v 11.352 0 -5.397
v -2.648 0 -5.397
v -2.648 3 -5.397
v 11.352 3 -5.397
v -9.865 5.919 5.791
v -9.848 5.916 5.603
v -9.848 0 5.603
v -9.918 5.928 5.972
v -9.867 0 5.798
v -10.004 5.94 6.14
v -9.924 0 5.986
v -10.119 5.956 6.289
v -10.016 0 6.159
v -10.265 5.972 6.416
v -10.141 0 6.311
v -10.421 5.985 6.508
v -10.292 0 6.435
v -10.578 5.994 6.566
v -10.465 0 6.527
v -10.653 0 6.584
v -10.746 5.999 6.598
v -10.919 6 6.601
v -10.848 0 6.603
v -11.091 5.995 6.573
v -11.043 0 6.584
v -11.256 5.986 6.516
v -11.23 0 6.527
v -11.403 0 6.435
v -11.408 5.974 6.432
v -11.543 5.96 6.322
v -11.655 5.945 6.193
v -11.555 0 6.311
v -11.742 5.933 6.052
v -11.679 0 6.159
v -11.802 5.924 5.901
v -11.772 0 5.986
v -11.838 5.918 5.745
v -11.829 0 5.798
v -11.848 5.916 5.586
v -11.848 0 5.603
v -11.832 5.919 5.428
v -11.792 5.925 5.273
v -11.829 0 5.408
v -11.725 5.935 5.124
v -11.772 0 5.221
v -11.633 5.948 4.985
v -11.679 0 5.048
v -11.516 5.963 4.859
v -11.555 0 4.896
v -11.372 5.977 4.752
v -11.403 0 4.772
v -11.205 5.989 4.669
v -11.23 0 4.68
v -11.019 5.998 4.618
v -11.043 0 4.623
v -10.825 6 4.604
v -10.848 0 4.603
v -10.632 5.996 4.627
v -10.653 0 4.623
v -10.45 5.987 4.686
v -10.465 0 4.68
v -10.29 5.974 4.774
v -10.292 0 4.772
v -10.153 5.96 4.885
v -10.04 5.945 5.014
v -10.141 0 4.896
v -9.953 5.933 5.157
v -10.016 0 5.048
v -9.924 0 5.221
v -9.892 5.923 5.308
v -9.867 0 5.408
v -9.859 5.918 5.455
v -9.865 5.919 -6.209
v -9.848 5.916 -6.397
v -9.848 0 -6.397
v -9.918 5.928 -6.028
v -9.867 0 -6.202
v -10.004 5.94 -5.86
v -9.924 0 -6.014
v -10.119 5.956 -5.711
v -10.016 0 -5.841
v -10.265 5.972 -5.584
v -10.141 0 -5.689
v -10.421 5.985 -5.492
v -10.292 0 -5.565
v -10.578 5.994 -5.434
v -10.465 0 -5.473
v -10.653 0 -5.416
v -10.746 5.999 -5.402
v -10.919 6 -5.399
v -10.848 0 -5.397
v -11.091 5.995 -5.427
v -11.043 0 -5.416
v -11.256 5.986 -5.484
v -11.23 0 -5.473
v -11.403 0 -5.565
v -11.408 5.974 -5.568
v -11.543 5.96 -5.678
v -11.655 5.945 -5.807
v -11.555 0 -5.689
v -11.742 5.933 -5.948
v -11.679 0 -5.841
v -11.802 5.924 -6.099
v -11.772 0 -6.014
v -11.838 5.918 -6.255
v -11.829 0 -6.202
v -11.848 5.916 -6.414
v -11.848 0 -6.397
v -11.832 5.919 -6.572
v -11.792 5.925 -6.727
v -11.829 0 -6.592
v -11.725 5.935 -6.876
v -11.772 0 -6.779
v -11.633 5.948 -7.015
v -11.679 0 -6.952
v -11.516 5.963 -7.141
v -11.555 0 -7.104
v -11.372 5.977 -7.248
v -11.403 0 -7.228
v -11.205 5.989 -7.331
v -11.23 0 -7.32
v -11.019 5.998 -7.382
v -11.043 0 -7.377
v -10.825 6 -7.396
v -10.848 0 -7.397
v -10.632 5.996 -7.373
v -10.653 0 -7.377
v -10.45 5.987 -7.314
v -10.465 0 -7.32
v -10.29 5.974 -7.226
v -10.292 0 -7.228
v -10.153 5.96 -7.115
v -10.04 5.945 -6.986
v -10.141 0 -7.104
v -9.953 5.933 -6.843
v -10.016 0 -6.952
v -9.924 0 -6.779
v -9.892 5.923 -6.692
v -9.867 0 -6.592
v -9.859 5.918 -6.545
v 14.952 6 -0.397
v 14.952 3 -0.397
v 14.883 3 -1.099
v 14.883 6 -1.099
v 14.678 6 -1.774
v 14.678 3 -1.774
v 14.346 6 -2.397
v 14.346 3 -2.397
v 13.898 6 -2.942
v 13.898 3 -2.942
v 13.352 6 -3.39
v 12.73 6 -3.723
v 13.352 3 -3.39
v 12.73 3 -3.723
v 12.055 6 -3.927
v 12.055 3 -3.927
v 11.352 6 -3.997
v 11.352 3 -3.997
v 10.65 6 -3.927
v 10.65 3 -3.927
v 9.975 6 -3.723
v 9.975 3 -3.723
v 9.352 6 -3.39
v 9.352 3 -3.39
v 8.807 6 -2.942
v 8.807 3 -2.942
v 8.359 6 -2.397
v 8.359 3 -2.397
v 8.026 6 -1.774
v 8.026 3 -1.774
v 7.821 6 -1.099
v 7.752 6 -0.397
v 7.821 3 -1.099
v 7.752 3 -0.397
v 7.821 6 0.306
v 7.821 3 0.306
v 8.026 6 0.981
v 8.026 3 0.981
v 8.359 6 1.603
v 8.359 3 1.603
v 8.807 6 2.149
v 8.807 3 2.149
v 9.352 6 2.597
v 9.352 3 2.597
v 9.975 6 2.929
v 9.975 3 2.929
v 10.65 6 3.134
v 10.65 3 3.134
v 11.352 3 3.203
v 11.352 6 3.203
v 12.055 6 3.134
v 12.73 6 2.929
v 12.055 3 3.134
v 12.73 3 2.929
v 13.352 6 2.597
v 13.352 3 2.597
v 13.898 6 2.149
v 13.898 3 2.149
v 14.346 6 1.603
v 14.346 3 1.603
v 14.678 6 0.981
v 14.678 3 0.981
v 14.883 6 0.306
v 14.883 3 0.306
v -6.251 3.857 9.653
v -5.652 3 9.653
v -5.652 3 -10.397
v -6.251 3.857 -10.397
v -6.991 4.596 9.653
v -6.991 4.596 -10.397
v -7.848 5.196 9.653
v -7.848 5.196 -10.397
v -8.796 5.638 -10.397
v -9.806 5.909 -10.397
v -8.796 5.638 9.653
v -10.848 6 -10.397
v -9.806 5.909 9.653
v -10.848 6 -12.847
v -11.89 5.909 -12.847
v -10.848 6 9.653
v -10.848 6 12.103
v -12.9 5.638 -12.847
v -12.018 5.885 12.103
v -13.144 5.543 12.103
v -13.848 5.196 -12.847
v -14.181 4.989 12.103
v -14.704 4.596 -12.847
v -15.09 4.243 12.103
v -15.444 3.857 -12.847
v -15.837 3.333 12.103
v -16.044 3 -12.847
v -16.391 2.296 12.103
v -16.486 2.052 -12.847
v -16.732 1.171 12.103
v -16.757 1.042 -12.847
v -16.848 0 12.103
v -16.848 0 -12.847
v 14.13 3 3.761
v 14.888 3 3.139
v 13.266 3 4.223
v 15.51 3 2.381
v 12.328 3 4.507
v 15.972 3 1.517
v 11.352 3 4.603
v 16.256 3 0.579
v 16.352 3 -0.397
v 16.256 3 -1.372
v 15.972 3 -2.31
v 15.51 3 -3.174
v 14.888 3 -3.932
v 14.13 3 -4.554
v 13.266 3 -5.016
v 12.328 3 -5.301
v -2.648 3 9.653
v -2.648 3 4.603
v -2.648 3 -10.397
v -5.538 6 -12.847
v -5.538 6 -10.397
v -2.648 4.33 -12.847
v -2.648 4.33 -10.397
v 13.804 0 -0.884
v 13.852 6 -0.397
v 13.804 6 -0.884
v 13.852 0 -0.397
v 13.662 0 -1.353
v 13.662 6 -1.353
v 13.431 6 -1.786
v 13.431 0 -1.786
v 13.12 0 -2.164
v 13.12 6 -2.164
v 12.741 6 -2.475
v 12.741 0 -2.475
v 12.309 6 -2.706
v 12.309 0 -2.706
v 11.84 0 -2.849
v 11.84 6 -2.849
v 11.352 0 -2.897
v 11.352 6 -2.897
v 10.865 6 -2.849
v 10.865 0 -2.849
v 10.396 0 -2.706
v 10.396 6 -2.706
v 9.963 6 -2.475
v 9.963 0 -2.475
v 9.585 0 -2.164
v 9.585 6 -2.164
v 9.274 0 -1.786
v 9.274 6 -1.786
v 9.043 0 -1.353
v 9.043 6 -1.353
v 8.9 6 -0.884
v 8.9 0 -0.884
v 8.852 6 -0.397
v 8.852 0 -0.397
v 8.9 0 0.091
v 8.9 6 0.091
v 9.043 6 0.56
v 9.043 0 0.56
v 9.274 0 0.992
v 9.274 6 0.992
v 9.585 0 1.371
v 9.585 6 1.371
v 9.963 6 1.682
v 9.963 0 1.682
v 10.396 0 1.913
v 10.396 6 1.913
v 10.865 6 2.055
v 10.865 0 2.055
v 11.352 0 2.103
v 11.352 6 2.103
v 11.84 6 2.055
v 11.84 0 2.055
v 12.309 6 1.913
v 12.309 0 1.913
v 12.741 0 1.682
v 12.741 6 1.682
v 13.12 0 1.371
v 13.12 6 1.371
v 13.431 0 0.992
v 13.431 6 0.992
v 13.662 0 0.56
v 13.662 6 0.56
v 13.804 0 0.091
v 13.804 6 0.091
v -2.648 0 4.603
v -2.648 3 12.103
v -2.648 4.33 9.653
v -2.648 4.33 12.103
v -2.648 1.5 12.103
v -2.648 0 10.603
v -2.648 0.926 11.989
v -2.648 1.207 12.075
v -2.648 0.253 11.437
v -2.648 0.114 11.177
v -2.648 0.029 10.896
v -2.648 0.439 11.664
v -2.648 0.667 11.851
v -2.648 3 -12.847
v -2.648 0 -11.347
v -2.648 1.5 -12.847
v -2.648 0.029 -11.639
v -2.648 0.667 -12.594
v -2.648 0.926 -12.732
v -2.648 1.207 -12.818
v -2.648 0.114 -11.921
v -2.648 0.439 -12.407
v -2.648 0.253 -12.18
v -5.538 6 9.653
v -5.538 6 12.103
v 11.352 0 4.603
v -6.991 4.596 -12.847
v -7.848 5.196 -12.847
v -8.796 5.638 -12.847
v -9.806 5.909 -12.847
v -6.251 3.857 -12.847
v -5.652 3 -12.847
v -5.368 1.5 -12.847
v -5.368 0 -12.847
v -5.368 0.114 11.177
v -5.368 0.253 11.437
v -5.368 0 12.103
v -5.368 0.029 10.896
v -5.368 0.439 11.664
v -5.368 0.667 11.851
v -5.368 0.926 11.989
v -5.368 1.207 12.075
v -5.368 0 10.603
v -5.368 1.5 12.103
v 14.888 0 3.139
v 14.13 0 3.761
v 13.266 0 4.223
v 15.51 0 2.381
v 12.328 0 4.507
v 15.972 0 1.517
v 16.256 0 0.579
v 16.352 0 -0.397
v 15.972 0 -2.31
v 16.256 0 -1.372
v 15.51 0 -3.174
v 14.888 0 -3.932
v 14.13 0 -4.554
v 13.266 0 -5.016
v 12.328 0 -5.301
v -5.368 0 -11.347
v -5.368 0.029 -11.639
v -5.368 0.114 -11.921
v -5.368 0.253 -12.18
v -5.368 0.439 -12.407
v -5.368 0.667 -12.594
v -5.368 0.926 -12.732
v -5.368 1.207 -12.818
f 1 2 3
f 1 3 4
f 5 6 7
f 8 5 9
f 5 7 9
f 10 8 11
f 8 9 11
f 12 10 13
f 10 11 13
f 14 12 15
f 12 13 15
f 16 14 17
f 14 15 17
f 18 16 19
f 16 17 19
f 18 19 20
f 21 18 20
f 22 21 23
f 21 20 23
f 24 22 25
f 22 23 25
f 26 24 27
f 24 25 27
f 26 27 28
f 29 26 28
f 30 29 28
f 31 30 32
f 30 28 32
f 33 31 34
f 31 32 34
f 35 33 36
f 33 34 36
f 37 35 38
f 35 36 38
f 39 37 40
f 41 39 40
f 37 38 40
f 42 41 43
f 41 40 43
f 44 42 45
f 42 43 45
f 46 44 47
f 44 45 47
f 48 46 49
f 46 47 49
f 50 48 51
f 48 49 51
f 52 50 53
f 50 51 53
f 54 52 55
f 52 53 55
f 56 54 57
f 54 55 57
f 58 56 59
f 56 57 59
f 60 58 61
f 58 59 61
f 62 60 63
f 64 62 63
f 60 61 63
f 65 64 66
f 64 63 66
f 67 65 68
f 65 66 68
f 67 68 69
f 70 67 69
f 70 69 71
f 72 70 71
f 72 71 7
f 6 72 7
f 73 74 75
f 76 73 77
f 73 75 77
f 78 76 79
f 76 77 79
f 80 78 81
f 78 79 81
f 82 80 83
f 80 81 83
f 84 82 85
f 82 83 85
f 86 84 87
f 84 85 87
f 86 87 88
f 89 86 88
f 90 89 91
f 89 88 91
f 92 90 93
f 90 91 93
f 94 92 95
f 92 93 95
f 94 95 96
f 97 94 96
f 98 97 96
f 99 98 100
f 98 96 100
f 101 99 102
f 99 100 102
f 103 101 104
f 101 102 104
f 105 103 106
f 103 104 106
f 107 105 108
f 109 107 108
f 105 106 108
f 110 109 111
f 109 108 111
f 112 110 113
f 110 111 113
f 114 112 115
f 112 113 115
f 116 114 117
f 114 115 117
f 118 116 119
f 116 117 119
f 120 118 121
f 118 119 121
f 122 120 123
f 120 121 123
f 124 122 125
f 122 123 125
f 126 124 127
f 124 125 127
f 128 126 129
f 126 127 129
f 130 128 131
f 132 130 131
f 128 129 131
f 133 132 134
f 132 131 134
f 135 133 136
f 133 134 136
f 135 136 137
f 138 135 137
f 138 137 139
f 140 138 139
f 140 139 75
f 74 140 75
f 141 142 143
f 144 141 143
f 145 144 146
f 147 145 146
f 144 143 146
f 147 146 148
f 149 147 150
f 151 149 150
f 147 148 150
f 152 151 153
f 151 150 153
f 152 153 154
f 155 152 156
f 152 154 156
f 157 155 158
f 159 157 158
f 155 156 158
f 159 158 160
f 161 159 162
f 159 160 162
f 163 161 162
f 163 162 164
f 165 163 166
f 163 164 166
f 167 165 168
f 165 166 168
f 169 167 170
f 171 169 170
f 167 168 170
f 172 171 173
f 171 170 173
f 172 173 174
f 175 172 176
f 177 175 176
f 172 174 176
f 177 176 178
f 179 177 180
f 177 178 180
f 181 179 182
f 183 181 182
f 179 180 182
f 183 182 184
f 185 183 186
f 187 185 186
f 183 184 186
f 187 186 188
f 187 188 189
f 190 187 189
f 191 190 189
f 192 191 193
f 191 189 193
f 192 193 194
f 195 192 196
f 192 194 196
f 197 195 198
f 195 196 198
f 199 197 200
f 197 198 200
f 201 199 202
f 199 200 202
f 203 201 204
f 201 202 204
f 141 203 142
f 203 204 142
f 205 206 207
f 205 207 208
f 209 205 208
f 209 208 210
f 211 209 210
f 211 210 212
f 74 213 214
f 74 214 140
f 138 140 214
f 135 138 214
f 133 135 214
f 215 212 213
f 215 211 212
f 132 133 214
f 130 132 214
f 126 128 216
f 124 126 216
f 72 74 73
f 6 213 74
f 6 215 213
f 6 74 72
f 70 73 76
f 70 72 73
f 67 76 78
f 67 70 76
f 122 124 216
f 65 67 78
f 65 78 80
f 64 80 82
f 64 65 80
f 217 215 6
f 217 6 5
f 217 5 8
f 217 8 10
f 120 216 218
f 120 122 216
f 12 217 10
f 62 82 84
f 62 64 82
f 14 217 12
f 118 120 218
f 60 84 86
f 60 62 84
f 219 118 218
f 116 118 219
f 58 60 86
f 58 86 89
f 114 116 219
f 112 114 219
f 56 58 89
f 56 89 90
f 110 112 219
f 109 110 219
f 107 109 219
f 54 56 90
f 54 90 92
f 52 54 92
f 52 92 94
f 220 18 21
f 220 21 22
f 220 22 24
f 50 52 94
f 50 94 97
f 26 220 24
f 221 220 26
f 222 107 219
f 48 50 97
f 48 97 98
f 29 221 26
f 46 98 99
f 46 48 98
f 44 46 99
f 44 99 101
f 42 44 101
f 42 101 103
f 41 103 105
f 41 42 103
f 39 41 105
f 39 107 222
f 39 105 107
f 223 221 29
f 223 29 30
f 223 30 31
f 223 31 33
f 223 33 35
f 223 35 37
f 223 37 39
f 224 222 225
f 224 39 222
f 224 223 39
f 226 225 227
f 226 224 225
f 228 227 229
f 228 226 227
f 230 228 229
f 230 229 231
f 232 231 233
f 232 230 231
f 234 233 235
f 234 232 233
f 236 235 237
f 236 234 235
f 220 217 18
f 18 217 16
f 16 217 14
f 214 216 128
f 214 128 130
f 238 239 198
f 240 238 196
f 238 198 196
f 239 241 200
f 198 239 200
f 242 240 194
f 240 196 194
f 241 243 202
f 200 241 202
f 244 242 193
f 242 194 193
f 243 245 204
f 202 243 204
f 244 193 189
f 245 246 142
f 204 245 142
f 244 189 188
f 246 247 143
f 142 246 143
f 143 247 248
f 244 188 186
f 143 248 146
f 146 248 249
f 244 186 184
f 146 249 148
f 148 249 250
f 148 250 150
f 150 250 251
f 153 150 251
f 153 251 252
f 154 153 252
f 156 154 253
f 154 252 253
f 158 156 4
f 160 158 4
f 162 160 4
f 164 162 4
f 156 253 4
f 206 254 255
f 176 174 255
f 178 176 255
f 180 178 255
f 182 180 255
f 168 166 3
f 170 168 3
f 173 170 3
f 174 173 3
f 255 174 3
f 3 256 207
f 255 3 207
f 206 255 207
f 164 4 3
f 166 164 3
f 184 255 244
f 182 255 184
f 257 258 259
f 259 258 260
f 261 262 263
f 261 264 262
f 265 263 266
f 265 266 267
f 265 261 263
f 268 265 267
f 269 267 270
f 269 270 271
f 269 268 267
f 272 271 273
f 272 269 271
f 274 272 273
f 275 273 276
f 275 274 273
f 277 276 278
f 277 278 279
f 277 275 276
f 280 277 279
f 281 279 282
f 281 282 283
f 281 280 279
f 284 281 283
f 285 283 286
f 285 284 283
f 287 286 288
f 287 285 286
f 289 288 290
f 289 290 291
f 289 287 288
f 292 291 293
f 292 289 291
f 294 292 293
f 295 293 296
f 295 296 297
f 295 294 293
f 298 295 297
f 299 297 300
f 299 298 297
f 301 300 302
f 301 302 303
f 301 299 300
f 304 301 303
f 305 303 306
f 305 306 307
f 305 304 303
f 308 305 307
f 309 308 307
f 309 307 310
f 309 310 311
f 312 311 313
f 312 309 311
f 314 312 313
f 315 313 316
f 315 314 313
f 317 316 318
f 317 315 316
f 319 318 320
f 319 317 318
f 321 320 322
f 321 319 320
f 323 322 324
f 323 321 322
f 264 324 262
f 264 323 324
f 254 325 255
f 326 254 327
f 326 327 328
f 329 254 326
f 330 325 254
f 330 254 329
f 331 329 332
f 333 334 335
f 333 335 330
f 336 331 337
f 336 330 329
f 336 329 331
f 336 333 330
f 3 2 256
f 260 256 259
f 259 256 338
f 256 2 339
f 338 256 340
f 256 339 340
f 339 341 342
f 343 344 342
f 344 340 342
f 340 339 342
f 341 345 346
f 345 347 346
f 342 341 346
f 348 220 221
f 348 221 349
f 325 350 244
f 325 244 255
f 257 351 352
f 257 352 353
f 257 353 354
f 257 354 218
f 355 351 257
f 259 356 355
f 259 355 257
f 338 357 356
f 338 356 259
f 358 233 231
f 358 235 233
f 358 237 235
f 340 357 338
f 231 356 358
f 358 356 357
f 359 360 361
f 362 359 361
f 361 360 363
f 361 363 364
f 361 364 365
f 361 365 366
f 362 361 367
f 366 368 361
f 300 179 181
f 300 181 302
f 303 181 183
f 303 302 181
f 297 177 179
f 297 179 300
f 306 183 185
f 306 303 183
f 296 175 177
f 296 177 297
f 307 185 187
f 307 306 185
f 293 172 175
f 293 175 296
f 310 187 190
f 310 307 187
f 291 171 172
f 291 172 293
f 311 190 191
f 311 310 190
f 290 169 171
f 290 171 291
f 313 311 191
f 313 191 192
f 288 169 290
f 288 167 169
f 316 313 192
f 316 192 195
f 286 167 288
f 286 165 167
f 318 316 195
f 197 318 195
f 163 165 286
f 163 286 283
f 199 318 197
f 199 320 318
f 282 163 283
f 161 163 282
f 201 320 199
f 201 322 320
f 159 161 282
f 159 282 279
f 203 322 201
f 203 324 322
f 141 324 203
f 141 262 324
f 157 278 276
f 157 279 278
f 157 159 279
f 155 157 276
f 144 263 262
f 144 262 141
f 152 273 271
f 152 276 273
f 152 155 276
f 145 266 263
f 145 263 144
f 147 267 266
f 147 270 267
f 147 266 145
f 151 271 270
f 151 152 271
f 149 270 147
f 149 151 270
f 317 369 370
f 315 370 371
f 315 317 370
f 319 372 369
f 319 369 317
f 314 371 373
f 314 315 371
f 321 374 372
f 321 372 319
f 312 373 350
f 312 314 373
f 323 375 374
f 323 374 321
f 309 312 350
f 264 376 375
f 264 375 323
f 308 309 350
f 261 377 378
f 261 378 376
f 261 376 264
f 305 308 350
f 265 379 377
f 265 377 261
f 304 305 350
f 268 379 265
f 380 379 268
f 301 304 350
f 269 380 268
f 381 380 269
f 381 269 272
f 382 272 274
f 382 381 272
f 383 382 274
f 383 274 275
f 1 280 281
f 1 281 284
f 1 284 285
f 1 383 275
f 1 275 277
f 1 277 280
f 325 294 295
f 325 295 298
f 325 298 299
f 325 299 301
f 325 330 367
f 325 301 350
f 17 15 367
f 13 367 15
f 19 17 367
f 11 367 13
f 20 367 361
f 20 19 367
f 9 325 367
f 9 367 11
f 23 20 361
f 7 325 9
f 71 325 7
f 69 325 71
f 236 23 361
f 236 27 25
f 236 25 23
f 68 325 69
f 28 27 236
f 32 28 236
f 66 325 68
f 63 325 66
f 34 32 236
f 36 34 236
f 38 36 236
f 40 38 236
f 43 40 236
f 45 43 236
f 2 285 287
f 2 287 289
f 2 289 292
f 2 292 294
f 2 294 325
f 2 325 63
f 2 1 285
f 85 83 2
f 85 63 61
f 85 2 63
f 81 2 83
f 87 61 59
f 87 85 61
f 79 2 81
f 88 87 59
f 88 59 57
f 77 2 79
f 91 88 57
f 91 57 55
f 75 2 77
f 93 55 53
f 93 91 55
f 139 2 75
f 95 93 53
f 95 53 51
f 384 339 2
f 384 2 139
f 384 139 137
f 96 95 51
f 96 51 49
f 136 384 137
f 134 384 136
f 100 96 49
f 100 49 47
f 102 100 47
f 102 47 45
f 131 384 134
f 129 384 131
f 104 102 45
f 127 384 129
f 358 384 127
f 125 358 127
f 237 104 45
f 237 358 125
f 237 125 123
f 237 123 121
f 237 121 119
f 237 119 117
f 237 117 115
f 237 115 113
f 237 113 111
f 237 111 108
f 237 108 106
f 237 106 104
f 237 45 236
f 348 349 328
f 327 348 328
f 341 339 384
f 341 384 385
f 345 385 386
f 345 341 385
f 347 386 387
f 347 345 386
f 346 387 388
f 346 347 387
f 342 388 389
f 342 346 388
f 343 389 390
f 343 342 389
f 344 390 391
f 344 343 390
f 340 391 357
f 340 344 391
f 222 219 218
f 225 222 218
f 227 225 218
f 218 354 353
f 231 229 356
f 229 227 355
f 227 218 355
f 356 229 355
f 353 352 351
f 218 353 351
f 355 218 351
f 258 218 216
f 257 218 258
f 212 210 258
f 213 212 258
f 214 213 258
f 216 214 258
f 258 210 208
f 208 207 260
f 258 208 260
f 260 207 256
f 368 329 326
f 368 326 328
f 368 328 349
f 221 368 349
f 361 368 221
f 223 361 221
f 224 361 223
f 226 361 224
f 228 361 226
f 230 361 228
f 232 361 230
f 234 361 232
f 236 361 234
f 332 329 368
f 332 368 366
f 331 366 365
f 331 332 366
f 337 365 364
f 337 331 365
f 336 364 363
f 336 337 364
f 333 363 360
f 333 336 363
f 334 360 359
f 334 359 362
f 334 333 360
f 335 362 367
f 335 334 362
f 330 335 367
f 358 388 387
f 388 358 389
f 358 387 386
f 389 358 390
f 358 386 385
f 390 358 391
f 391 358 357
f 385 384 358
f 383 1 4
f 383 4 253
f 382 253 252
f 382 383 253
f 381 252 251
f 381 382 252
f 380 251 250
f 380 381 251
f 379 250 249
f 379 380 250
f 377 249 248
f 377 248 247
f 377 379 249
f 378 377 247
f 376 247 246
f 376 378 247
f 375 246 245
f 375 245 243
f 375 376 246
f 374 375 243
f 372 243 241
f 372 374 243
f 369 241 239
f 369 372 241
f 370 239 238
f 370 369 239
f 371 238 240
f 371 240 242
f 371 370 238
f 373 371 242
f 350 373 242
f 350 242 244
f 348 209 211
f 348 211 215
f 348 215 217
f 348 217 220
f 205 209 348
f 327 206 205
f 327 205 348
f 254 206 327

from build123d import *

# Parameters (mm, degrees)
CROQUIS1_R              = 2.500000266
CROQUIS1_R_2            = 1.000000047
CROQUIS1_R_3            = 1.000000141
SALIENTE_EXTRUIR1_DEPTH = 3
SALIENTE_EXTRUIR2_DEPTH = 24.95
CROQUIS3_W              = 8.200000763
CROQUIS3_H              = 2.45
SALIENTE_EXTRUIR3_DEPTH = 3
CORTAR_EXTRUIR1_DEPTH   = 31
CORTAR_EXTRUIR2_DEPTH   = 2.72
CROQUIS6_R              = 3.6
CROQUIS6_R_2            = 2.500000266
SALIENTE_EXTRUIR4_DEPTH = 3
CORTAR_EXTRUIR3_DEPTH   = 27
CROQUIS8_R              = 1.000000047
CROQUIS8_R_2            = 1.000000141
CORTAR_EXTRUIR4_DEPTH   = 27


with BuildPart() as part:
    # Croquis1 → Saliente-Extruir1 (new body)
    with BuildSketch(Plane(origin=(0, 0, 0), x_dir=(1, 0, 0), z_dir=(0, 1, 0))):
        with BuildLine():
            Line((-16.847731683, 12.84659639), (-2.64773092, 12.84659639))
            Line((-2.64773092, 12.84659639), (-2.64773092, 5.396596581))
            Line((-2.64773092, 5.396596581), (11.352269703, 5.396596581))
            ThreePointArc((11.352269703, 5.396596581), (16.352269703, 0.396596581), (11.352269703, -4.603403419))
            Line((11.352269703, -4.603403419), (-2.64773092, -4.603403419))
            Line((-2.64773092, -4.603403419), (-2.64773092, -12.103403419))
            Line((-2.64773092, -12.103403419), (-16.847731683, -12.103403419))
            Line((-16.847731683, -12.103403419), (-16.847731683, 12.84659639))
        make_face()
        with Locations((11.352269089, 0.39659652)):
            Circle(CROQUIS1_R, mode=Mode.SUBTRACT)
        with Locations((-10.847731494, 6.396596534)):
            Circle(CROQUIS1_R_2, mode=Mode.SUBTRACT)
        with Locations((-10.847730816, -5.603403561)):
            Circle(CROQUIS1_R_3, mode=Mode.SUBTRACT)
    extrude(amount=SALIENTE_EXTRUIR1_DEPTH)

    # Croquis2 → Saliente-Extruir2 (add)
    with BuildSketch(Plane.XY.offset(12.103403419)):
        with BuildLine():
            Line((-16.043884106, 3), (-5.651579261, 3))
            ThreePointArc((-5.651579261, 3), (-10.847731683, 6), (-16.043884106, 3))
        make_face()
    extrude(amount=-SALIENTE_EXTRUIR2_DEPTH)

    # Croquis3 → Saliente-Extruir3 (add)
    with BuildSketch(Plane(origin=(0, 3, 0), x_dir=(1, 0, 0), z_dir=(0, 1, 0))):
        with Locations((-6.747731302, 11.62159639)):
            Rectangle(CROQUIS3_W, CROQUIS3_H)
        with Locations((-6.747731302, -10.878403419)):
            Rectangle(CROQUIS3_W, CROQUIS3_H)
    extrude(amount=SALIENTE_EXTRUIR3_DEPTH)

    # Croquis4 → Cortar-Extruir1 (cut)
    with BuildSketch(Plane.XY.offset(12.103403419)):
        Polygon((-2.64773092, 4.33), (-2.64773092, 6), (-5.53773092, 6), align=None)
    extrude(amount=-CORTAR_EXTRUIR1_DEPTH, mode=Mode.SUBTRACT)

    # Croquis5 → Cortar-Extruir2 (cut)
    with BuildSketch(Plane(origin=(-2.64773092, 0, 0), x_dir=(0, 0, -1), z_dir=(1, 0, 0))):
        with BuildLine():
            Line((12.84659639, 1.5), (14.964292121, 1.5))
            ThreePointArc((14.964292121, 1.5), (0, -14.850313202), (-14.964292121, 1.5))
            Line((-14.964292121, 1.5), (-12.103403419, 1.5))
            ThreePointArc((-12.103403419, 1.5), (-11.664063591, 0.439339828), (-10.603403419, 0))
            Line((-10.603403419, 0), (11.34659639, 0))
            ThreePointArc((11.34659639, 0), (12.407256562, 0.439339828), (12.84659639, 1.5))
        make_face()
    extrude(amount=-CORTAR_EXTRUIR2_DEPTH, mode=Mode.SUBTRACT)

    # Croquis6 → Saliente-Extruir4 (add)
    with BuildSketch(Plane(origin=(0, 3, 0), x_dir=(1, 0, 0), z_dir=(0, 1, 0))):
        with Locations((11.352269089, 0.39659652)):
            Circle(CROQUIS6_R)
        with Locations((11.352269089, 0.39659652)):
            Circle(CROQUIS6_R_2, mode=Mode.SUBTRACT)
    extrude(amount=SALIENTE_EXTRUIR4_DEPTH)

    # Croquis7 → Cortar-Extruir3 (cut)
    with BuildSketch(Plane.XY.offset(12.103403419)):
        with BuildLine():
            Line((-12.758872324, 7.288729336), (-12.369518171, 5.803806155))
            ThreePointArc((-12.369518171, 5.803806155), (-15.59803267, 3.665329526), (-16.847731683, 0))
            Line((-16.847731683, 0), (-18.382851714, 0))
            ThreePointArc((-18.382851714, 0), (-16.813413036, 4.603116322), (-12.758872324, 7.288729336))
        make_face()
    extrude(amount=-CORTAR_EXTRUIR3_DEPTH, mode=Mode.SUBTRACT)

    # Croquis8 → Cortar-Extruir4 (cut)
    with BuildSketch(Plane.XZ):
        with Locations((-10.847731494, -6.396596534)):
            Circle(CROQUIS8_R)
        with Locations((-10.847730816, 5.603403561)):
            Circle(CROQUIS8_R_2)
    extrude(amount=-CORTAR_EXTRUIR4_DEPTH, mode=Mode.SUBTRACT)


solid = part.part
